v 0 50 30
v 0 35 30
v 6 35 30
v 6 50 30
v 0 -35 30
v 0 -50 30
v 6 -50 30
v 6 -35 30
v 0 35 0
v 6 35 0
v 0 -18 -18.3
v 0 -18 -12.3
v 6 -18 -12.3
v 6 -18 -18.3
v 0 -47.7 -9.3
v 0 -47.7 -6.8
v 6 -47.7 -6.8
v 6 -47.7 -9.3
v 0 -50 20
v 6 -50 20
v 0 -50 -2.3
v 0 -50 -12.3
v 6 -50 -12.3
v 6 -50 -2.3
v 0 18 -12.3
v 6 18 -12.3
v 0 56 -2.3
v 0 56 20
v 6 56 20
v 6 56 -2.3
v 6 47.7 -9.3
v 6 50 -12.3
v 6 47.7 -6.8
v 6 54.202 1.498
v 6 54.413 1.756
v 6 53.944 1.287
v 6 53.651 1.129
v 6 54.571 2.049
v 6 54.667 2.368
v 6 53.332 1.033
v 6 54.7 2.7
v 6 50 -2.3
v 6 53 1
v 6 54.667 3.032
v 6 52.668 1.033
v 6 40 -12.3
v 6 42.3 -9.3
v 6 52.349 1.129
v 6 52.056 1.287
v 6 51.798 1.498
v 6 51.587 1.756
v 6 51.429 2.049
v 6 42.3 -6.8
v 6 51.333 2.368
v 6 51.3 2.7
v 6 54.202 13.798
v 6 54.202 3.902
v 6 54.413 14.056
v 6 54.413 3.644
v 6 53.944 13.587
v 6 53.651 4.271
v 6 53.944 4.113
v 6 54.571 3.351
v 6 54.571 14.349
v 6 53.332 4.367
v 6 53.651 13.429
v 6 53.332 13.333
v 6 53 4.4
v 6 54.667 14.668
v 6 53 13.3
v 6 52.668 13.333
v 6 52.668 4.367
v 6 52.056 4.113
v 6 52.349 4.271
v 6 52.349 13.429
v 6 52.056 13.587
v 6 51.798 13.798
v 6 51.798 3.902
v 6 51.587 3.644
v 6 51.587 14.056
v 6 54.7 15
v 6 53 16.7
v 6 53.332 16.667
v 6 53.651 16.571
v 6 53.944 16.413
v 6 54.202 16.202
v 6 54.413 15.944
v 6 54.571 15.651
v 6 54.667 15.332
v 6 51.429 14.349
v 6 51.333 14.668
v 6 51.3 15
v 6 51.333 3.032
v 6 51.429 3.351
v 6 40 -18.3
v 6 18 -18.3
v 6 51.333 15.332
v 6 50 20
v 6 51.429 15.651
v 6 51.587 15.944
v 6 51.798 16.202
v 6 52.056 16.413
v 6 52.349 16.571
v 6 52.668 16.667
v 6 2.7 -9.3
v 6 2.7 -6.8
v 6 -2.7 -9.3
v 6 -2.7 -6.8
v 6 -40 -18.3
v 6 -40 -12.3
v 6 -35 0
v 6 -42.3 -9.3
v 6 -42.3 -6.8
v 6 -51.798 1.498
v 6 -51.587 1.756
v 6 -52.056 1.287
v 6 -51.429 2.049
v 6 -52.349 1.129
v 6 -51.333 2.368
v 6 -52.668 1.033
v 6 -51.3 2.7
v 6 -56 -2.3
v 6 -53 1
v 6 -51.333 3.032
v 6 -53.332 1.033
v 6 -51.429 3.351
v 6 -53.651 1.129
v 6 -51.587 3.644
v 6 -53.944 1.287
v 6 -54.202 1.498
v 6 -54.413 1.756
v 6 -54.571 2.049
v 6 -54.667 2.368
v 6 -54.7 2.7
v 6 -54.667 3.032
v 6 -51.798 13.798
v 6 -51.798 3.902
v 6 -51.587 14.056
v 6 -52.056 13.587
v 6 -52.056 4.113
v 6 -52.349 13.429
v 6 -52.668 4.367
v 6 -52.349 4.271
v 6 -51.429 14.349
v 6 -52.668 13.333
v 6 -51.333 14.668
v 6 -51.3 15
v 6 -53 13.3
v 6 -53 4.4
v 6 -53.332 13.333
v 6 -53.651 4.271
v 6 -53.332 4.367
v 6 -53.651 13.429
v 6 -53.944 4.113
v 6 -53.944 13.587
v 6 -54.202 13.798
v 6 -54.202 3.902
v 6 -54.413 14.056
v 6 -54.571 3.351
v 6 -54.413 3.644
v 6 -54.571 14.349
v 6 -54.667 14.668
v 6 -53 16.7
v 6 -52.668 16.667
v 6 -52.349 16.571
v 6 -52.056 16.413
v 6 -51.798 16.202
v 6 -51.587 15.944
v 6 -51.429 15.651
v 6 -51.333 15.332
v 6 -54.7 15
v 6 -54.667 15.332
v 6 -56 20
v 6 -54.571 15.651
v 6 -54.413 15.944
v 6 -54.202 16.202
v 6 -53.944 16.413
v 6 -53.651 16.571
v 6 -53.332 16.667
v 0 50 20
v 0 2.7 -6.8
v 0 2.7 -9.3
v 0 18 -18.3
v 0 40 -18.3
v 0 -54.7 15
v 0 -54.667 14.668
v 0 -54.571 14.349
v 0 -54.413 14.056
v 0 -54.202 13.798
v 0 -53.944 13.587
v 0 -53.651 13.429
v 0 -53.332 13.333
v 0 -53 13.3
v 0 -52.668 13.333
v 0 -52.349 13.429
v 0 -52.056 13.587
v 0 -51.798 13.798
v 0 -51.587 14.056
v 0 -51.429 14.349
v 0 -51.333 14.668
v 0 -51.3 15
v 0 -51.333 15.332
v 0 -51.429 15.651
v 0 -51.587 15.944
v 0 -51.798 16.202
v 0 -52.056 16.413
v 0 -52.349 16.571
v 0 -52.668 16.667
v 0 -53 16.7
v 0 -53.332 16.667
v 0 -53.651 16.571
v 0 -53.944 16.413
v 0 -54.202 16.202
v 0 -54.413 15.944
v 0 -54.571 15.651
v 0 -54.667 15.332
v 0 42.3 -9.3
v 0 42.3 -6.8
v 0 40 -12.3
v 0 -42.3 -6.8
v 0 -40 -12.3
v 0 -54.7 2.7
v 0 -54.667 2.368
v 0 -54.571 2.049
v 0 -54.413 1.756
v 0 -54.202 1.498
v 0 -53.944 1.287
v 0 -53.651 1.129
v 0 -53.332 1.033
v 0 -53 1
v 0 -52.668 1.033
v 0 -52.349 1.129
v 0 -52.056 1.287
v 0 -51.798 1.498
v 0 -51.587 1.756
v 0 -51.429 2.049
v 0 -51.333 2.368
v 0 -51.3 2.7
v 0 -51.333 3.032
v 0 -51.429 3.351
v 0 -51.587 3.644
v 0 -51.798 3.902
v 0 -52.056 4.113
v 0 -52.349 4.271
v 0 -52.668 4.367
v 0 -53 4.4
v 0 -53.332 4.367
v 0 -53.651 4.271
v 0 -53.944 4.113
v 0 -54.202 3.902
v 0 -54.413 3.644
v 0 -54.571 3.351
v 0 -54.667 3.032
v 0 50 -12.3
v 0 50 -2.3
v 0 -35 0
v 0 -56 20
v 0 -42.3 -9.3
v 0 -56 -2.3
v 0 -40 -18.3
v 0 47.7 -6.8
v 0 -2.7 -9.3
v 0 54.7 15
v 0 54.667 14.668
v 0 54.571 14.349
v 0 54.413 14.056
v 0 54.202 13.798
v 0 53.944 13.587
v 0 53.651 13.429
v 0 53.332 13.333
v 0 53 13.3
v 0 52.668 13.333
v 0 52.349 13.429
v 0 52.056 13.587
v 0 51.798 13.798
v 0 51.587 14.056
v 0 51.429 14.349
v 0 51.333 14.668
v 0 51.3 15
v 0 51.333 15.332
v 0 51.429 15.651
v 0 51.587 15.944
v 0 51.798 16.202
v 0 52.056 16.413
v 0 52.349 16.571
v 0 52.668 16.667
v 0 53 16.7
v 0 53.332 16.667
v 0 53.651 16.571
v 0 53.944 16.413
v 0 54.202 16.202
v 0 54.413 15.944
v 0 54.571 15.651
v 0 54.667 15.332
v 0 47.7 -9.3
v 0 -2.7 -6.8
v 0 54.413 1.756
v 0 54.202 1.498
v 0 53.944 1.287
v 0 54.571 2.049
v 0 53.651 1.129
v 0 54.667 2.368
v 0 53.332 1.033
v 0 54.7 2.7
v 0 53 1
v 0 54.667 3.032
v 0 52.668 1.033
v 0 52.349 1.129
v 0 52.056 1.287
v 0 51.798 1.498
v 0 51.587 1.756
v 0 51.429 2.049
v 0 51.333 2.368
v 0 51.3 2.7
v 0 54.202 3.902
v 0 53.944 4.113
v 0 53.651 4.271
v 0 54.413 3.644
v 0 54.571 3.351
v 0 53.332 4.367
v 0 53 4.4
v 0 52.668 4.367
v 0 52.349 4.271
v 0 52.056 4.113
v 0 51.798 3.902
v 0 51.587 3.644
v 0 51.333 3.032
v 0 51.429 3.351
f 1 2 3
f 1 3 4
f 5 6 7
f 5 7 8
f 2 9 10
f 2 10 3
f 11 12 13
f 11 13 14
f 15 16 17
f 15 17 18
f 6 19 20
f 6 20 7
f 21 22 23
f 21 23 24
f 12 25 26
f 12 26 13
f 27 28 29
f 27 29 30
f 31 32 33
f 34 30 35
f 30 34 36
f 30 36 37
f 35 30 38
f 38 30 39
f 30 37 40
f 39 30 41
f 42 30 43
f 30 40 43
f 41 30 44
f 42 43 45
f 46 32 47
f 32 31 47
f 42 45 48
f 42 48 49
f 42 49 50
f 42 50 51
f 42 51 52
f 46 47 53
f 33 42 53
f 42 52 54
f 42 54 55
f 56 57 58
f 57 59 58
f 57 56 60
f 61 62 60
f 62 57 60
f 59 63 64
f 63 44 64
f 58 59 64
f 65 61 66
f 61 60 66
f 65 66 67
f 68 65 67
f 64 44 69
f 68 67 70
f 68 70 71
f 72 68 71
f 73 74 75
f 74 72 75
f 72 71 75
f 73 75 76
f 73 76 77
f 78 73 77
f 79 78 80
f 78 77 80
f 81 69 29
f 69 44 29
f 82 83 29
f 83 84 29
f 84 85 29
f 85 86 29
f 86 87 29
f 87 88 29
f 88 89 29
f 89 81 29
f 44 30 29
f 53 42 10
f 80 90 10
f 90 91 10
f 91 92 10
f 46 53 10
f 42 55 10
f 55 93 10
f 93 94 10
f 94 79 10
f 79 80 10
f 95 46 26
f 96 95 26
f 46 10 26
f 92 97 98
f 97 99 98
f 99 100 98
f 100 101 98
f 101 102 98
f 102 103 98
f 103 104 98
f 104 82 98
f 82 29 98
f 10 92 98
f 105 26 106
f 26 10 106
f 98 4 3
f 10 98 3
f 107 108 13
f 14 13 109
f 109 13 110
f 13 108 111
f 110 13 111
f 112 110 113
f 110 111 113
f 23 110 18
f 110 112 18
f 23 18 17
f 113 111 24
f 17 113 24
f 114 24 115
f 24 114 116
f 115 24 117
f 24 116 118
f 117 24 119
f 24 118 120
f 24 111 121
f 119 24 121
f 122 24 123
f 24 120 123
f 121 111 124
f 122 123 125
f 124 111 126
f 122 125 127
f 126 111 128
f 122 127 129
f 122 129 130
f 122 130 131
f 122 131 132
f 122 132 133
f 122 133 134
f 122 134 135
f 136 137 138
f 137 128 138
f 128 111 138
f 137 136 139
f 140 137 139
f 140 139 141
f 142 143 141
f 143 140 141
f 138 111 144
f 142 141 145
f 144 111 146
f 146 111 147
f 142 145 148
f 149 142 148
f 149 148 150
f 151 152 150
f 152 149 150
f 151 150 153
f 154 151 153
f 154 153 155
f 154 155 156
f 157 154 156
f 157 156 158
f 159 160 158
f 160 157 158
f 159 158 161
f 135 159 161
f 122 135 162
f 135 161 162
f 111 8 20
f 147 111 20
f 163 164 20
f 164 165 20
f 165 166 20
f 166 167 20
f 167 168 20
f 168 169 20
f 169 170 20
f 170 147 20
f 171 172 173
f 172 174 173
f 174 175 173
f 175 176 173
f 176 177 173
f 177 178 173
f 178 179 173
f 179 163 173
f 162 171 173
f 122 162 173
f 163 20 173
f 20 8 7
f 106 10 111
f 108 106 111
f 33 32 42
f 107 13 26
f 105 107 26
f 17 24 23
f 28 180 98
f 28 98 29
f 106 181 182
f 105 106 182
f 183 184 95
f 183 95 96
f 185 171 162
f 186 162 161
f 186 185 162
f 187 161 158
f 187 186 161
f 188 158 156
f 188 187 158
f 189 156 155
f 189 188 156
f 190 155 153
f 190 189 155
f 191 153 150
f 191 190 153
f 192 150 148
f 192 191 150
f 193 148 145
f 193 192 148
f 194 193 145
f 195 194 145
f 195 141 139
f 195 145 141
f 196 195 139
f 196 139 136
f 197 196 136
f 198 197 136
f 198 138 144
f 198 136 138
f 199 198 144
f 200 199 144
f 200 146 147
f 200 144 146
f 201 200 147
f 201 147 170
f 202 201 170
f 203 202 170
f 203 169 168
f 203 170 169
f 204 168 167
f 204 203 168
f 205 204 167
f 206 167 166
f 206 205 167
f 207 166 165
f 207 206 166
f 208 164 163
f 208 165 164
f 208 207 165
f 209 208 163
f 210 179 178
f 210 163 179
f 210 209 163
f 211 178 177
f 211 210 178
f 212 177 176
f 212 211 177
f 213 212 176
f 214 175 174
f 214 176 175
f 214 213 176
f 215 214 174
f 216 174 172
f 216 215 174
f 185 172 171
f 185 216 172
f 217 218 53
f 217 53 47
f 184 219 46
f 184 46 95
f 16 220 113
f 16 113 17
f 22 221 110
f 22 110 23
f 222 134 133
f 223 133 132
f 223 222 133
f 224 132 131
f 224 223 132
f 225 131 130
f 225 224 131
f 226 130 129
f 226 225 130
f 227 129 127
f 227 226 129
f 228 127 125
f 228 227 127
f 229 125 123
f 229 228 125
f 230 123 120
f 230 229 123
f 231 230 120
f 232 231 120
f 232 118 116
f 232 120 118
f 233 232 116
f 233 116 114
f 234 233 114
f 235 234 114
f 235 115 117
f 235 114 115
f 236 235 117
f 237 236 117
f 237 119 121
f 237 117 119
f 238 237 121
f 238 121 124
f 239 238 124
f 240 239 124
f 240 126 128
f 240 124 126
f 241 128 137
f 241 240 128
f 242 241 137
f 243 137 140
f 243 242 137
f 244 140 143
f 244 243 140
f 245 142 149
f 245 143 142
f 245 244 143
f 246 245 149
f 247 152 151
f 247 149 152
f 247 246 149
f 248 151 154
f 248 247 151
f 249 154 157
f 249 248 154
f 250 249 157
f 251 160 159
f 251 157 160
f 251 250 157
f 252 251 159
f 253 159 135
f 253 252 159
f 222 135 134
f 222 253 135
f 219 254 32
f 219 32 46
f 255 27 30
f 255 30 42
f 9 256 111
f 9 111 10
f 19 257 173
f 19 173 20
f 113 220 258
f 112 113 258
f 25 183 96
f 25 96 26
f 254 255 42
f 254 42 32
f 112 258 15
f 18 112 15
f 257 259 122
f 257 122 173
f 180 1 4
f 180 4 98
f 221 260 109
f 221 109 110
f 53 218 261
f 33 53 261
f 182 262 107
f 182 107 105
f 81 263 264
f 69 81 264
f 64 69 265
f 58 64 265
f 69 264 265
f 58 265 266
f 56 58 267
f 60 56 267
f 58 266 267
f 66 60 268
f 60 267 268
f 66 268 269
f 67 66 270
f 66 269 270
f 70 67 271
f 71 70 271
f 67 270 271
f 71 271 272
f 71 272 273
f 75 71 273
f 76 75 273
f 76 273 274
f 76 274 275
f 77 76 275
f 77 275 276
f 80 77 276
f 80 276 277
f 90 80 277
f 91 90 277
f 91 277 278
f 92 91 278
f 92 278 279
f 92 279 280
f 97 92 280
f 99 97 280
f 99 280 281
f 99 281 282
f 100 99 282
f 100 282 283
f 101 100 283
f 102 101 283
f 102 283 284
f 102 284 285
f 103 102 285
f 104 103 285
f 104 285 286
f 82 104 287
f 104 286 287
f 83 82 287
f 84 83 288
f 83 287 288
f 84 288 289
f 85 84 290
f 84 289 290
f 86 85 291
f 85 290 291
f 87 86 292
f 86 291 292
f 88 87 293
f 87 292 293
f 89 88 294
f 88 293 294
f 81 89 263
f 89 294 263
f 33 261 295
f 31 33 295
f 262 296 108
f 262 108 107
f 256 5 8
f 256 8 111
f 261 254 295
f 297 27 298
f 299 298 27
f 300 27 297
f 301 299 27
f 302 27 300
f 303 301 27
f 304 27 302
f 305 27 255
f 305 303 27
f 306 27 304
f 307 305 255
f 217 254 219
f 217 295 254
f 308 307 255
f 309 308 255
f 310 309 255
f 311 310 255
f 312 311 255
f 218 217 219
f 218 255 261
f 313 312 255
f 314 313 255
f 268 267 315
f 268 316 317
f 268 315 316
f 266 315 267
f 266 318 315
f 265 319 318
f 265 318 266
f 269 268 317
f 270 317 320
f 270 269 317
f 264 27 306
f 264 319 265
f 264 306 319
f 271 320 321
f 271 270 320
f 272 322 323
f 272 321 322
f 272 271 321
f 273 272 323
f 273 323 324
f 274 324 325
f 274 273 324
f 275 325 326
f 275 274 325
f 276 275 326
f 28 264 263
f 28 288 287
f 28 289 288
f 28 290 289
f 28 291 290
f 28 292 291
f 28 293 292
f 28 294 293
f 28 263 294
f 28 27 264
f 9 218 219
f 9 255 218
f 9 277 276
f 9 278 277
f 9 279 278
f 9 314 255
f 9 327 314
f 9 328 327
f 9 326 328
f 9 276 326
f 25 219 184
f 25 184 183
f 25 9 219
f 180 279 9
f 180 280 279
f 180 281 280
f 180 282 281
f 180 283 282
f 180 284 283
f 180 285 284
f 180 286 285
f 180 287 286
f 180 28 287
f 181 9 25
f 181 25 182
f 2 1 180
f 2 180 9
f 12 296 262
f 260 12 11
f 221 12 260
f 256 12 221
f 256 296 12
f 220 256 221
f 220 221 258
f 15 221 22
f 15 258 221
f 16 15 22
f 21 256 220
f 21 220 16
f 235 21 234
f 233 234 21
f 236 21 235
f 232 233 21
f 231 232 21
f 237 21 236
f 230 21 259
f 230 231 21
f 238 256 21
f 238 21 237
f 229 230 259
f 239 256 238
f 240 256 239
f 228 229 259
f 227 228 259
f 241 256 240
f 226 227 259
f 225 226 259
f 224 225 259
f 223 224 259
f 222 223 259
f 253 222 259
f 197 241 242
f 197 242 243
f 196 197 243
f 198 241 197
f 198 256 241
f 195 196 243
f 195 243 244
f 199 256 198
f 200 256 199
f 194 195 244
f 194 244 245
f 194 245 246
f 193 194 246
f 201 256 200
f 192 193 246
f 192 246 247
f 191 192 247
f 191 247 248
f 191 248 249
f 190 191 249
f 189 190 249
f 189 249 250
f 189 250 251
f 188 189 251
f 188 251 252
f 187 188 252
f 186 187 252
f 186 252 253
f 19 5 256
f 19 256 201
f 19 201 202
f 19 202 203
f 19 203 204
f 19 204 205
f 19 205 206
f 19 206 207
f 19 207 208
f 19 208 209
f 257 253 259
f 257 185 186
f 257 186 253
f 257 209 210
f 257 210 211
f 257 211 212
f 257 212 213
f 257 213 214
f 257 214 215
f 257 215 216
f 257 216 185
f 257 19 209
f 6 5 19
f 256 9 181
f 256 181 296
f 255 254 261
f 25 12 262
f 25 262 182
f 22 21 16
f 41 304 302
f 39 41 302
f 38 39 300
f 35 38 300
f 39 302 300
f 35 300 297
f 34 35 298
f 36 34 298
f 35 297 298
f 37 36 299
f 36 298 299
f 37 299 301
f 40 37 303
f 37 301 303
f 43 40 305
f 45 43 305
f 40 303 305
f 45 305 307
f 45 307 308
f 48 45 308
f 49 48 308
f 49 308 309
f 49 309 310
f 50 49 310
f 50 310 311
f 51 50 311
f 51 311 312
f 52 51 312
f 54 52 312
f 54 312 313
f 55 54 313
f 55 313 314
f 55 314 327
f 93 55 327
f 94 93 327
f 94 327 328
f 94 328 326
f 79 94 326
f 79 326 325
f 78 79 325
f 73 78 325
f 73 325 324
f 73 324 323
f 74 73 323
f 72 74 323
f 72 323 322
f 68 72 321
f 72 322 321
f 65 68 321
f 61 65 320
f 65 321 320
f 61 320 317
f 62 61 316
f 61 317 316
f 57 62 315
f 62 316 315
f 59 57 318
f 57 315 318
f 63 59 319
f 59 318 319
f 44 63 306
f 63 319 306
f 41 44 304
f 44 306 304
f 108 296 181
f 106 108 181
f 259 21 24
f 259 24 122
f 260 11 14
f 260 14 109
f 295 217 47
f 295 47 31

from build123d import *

# Parameters (mm, degrees)
PAD_DEPTH       = 6
SKETCH001_W     = 5.4
SKETCH001_H     = 2.5
SKETCH001_W_2   = 2.7
POCKET_DEPTH    = 250.237688
SKETCH002_R     = 1.7
POCKET001_DEPTH = 250.237688


with BuildPart() as part:
    # Sketch → Pad (new body)
    with BuildSketch(Plane.YZ):
        Polygon((-50, 30), (-35, 30), (-35, 0), (35, 0), (35, 30), (50, 30), (50, 20), (56, 20), (56, -2.3), (50, -2.3), (50, -12.3), (40, -12.3), (40, -18.3), (18, -18.3), (18, -12.3), (-18, -12.3), (-18, -18.3), (-40, -18.3), (-40, -12.3), (-50, -12.3), (-50, -2.3), (-56, -2.3), (-56, 20), (-50, 20), align=None)
    extrude(amount=PAD_DEPTH)

    # Sketch001 (on Face25 of Pad) → Pocket (cut, through all)
    with BuildSketch(Plane(origin=(0, 0, 0), x_dir=(0, 1, 0), z_dir=(-1, 0, 0))):
        with Locations((45, 8.05)):
            Rectangle(SKETCH001_W, SKETCH001_H)
        with Locations((1.35, 8.05)):
            Rectangle(SKETCH001_W_2, SKETCH001_H)
    pocket = extrude(amount=-POCKET_DEPTH, mode=Mode.SUBTRACT)

    # Mirrored: Pocket across Sketch001 V_Axis
    add(pocket.mirror(Plane(origin=(0, 0, 0), x_dir=(-1, 0, 0), z_dir=(0, 1, 0))), mode=Mode.SUBTRACT)

    # Sketch002 (on Face4 of Mirrored) → Pocket001 (cut, through all)
    with BuildSketch(Plane(origin=(0, 0, 0), x_dir=(0, 1, 0), z_dir=(-1, 0, 0))):
        with Locations((53, -15)):
            Circle(SKETCH002_R)
        with Locations((53, -2.7)):
            Circle(SKETCH002_R)
    pocket001 = extrude(amount=-POCKET001_DEPTH, mode=Mode.SUBTRACT)

    # Mirrored001: Pocket001 across Sketch002 V_Axis
    add(pocket001.mirror(Plane(origin=(0, 0, 0), x_dir=(-1, 0, 0), z_dir=(0, 1, 0))), mode=Mode.SUBTRACT)


solid = part.part
